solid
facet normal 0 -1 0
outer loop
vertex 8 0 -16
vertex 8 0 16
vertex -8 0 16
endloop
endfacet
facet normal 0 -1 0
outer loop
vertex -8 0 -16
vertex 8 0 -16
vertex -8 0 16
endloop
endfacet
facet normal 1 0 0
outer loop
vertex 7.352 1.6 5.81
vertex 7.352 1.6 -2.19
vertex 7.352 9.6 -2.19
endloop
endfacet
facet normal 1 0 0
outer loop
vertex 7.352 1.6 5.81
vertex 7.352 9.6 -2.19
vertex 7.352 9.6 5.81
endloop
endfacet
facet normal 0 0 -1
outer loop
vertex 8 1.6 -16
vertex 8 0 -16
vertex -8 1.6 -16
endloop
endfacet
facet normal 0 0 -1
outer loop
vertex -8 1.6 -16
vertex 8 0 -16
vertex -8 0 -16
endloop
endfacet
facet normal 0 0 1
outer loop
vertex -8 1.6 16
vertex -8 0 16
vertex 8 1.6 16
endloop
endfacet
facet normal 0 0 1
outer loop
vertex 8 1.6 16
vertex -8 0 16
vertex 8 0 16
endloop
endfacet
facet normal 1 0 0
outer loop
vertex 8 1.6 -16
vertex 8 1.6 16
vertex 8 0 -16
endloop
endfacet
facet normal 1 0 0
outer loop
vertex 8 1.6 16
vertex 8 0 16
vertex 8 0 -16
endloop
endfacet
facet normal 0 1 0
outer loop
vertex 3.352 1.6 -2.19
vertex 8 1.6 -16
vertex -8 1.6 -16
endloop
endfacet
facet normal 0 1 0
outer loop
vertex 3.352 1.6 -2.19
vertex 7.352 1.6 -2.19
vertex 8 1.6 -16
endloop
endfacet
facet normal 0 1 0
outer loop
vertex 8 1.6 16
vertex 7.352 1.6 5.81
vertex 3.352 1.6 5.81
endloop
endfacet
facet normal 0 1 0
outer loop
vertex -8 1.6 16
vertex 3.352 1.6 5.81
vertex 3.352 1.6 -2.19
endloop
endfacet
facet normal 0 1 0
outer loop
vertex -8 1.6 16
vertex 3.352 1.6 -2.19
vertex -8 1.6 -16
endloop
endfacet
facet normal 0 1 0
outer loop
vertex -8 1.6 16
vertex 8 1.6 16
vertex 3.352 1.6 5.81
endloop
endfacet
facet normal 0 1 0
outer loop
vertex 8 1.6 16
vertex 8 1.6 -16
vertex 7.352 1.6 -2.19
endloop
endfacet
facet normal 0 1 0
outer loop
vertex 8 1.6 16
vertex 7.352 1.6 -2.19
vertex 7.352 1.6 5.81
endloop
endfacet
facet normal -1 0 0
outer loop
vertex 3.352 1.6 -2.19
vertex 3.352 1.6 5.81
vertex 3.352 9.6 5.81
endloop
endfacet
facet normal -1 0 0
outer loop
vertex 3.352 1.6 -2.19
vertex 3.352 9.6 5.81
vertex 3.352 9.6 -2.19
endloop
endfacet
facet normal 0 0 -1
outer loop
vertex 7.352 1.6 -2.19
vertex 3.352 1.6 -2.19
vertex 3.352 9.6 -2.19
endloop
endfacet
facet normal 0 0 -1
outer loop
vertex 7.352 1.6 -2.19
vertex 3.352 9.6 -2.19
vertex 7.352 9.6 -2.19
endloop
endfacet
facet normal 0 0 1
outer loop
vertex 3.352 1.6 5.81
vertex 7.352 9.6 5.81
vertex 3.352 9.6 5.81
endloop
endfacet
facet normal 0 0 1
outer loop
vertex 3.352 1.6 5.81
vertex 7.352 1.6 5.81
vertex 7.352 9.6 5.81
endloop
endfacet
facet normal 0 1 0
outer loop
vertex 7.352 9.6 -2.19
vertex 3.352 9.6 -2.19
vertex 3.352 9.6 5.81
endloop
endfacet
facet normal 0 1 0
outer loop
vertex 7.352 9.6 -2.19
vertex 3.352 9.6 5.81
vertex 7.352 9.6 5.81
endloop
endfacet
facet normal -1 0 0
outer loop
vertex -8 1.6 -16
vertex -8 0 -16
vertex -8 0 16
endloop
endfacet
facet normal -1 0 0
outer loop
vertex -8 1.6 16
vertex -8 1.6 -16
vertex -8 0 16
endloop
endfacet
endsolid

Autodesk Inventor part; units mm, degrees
ref_plane "YZ Plane" through (0, 0, 0) normal (1, 0, 0) x (0, 1, 0)
ref_plane "XZ Plane" through (0, 0, 0) normal (0, 1, 0) x (-1, 0, 0)
ref_plane "XY Plane" through (0, 0, 0) normal (0, 0, 1) x (1, 0, 0)
sketch "Sketch1" plane through (0, 0, 0) normal (0, 1, 0) x (-1, 0, 0)
  line L0 (-8, -16) -> (8, -16)
  line L1 (8, -16) -> (8, 16)
  line L2 (8, 16) -> (-8, 16)
  line L3 (-8, 16) -> (-8, -16)
  line L4 (-8, -16) -> (8, 16) construction
  line L5 (8, -16) -> (-8, 16) construction
  point P0 (0, 0)
  dimension "d0" = 16
  dimension "d1" = 32
extrude "Extrusion1" add sketch "Sketch1" along normal blind 1.6
sketch "Sketch2" plane through (0, 1.6, 0) normal (0, 1, 0) x (1, 0, 0)
  line L0 (3.3525, 2.1899) -> (7.3525, 2.1899)
  line L1 (7.3525, 2.1899) -> (7.3525, -5.8101)
  line L2 (7.3525, -5.8101) -> (3.3525, -5.8101)
  line L3 (3.3525, -5.8101) -> (3.3525, 2.1899)
  point P0 (0, 0)
  dimension "d4" = 4
  dimension "d5" = 8
extrude "Extrusion2" add sketch "Sketch2" along normal blind 8
properties part number "boost-converter" material "ABS Plastic"
